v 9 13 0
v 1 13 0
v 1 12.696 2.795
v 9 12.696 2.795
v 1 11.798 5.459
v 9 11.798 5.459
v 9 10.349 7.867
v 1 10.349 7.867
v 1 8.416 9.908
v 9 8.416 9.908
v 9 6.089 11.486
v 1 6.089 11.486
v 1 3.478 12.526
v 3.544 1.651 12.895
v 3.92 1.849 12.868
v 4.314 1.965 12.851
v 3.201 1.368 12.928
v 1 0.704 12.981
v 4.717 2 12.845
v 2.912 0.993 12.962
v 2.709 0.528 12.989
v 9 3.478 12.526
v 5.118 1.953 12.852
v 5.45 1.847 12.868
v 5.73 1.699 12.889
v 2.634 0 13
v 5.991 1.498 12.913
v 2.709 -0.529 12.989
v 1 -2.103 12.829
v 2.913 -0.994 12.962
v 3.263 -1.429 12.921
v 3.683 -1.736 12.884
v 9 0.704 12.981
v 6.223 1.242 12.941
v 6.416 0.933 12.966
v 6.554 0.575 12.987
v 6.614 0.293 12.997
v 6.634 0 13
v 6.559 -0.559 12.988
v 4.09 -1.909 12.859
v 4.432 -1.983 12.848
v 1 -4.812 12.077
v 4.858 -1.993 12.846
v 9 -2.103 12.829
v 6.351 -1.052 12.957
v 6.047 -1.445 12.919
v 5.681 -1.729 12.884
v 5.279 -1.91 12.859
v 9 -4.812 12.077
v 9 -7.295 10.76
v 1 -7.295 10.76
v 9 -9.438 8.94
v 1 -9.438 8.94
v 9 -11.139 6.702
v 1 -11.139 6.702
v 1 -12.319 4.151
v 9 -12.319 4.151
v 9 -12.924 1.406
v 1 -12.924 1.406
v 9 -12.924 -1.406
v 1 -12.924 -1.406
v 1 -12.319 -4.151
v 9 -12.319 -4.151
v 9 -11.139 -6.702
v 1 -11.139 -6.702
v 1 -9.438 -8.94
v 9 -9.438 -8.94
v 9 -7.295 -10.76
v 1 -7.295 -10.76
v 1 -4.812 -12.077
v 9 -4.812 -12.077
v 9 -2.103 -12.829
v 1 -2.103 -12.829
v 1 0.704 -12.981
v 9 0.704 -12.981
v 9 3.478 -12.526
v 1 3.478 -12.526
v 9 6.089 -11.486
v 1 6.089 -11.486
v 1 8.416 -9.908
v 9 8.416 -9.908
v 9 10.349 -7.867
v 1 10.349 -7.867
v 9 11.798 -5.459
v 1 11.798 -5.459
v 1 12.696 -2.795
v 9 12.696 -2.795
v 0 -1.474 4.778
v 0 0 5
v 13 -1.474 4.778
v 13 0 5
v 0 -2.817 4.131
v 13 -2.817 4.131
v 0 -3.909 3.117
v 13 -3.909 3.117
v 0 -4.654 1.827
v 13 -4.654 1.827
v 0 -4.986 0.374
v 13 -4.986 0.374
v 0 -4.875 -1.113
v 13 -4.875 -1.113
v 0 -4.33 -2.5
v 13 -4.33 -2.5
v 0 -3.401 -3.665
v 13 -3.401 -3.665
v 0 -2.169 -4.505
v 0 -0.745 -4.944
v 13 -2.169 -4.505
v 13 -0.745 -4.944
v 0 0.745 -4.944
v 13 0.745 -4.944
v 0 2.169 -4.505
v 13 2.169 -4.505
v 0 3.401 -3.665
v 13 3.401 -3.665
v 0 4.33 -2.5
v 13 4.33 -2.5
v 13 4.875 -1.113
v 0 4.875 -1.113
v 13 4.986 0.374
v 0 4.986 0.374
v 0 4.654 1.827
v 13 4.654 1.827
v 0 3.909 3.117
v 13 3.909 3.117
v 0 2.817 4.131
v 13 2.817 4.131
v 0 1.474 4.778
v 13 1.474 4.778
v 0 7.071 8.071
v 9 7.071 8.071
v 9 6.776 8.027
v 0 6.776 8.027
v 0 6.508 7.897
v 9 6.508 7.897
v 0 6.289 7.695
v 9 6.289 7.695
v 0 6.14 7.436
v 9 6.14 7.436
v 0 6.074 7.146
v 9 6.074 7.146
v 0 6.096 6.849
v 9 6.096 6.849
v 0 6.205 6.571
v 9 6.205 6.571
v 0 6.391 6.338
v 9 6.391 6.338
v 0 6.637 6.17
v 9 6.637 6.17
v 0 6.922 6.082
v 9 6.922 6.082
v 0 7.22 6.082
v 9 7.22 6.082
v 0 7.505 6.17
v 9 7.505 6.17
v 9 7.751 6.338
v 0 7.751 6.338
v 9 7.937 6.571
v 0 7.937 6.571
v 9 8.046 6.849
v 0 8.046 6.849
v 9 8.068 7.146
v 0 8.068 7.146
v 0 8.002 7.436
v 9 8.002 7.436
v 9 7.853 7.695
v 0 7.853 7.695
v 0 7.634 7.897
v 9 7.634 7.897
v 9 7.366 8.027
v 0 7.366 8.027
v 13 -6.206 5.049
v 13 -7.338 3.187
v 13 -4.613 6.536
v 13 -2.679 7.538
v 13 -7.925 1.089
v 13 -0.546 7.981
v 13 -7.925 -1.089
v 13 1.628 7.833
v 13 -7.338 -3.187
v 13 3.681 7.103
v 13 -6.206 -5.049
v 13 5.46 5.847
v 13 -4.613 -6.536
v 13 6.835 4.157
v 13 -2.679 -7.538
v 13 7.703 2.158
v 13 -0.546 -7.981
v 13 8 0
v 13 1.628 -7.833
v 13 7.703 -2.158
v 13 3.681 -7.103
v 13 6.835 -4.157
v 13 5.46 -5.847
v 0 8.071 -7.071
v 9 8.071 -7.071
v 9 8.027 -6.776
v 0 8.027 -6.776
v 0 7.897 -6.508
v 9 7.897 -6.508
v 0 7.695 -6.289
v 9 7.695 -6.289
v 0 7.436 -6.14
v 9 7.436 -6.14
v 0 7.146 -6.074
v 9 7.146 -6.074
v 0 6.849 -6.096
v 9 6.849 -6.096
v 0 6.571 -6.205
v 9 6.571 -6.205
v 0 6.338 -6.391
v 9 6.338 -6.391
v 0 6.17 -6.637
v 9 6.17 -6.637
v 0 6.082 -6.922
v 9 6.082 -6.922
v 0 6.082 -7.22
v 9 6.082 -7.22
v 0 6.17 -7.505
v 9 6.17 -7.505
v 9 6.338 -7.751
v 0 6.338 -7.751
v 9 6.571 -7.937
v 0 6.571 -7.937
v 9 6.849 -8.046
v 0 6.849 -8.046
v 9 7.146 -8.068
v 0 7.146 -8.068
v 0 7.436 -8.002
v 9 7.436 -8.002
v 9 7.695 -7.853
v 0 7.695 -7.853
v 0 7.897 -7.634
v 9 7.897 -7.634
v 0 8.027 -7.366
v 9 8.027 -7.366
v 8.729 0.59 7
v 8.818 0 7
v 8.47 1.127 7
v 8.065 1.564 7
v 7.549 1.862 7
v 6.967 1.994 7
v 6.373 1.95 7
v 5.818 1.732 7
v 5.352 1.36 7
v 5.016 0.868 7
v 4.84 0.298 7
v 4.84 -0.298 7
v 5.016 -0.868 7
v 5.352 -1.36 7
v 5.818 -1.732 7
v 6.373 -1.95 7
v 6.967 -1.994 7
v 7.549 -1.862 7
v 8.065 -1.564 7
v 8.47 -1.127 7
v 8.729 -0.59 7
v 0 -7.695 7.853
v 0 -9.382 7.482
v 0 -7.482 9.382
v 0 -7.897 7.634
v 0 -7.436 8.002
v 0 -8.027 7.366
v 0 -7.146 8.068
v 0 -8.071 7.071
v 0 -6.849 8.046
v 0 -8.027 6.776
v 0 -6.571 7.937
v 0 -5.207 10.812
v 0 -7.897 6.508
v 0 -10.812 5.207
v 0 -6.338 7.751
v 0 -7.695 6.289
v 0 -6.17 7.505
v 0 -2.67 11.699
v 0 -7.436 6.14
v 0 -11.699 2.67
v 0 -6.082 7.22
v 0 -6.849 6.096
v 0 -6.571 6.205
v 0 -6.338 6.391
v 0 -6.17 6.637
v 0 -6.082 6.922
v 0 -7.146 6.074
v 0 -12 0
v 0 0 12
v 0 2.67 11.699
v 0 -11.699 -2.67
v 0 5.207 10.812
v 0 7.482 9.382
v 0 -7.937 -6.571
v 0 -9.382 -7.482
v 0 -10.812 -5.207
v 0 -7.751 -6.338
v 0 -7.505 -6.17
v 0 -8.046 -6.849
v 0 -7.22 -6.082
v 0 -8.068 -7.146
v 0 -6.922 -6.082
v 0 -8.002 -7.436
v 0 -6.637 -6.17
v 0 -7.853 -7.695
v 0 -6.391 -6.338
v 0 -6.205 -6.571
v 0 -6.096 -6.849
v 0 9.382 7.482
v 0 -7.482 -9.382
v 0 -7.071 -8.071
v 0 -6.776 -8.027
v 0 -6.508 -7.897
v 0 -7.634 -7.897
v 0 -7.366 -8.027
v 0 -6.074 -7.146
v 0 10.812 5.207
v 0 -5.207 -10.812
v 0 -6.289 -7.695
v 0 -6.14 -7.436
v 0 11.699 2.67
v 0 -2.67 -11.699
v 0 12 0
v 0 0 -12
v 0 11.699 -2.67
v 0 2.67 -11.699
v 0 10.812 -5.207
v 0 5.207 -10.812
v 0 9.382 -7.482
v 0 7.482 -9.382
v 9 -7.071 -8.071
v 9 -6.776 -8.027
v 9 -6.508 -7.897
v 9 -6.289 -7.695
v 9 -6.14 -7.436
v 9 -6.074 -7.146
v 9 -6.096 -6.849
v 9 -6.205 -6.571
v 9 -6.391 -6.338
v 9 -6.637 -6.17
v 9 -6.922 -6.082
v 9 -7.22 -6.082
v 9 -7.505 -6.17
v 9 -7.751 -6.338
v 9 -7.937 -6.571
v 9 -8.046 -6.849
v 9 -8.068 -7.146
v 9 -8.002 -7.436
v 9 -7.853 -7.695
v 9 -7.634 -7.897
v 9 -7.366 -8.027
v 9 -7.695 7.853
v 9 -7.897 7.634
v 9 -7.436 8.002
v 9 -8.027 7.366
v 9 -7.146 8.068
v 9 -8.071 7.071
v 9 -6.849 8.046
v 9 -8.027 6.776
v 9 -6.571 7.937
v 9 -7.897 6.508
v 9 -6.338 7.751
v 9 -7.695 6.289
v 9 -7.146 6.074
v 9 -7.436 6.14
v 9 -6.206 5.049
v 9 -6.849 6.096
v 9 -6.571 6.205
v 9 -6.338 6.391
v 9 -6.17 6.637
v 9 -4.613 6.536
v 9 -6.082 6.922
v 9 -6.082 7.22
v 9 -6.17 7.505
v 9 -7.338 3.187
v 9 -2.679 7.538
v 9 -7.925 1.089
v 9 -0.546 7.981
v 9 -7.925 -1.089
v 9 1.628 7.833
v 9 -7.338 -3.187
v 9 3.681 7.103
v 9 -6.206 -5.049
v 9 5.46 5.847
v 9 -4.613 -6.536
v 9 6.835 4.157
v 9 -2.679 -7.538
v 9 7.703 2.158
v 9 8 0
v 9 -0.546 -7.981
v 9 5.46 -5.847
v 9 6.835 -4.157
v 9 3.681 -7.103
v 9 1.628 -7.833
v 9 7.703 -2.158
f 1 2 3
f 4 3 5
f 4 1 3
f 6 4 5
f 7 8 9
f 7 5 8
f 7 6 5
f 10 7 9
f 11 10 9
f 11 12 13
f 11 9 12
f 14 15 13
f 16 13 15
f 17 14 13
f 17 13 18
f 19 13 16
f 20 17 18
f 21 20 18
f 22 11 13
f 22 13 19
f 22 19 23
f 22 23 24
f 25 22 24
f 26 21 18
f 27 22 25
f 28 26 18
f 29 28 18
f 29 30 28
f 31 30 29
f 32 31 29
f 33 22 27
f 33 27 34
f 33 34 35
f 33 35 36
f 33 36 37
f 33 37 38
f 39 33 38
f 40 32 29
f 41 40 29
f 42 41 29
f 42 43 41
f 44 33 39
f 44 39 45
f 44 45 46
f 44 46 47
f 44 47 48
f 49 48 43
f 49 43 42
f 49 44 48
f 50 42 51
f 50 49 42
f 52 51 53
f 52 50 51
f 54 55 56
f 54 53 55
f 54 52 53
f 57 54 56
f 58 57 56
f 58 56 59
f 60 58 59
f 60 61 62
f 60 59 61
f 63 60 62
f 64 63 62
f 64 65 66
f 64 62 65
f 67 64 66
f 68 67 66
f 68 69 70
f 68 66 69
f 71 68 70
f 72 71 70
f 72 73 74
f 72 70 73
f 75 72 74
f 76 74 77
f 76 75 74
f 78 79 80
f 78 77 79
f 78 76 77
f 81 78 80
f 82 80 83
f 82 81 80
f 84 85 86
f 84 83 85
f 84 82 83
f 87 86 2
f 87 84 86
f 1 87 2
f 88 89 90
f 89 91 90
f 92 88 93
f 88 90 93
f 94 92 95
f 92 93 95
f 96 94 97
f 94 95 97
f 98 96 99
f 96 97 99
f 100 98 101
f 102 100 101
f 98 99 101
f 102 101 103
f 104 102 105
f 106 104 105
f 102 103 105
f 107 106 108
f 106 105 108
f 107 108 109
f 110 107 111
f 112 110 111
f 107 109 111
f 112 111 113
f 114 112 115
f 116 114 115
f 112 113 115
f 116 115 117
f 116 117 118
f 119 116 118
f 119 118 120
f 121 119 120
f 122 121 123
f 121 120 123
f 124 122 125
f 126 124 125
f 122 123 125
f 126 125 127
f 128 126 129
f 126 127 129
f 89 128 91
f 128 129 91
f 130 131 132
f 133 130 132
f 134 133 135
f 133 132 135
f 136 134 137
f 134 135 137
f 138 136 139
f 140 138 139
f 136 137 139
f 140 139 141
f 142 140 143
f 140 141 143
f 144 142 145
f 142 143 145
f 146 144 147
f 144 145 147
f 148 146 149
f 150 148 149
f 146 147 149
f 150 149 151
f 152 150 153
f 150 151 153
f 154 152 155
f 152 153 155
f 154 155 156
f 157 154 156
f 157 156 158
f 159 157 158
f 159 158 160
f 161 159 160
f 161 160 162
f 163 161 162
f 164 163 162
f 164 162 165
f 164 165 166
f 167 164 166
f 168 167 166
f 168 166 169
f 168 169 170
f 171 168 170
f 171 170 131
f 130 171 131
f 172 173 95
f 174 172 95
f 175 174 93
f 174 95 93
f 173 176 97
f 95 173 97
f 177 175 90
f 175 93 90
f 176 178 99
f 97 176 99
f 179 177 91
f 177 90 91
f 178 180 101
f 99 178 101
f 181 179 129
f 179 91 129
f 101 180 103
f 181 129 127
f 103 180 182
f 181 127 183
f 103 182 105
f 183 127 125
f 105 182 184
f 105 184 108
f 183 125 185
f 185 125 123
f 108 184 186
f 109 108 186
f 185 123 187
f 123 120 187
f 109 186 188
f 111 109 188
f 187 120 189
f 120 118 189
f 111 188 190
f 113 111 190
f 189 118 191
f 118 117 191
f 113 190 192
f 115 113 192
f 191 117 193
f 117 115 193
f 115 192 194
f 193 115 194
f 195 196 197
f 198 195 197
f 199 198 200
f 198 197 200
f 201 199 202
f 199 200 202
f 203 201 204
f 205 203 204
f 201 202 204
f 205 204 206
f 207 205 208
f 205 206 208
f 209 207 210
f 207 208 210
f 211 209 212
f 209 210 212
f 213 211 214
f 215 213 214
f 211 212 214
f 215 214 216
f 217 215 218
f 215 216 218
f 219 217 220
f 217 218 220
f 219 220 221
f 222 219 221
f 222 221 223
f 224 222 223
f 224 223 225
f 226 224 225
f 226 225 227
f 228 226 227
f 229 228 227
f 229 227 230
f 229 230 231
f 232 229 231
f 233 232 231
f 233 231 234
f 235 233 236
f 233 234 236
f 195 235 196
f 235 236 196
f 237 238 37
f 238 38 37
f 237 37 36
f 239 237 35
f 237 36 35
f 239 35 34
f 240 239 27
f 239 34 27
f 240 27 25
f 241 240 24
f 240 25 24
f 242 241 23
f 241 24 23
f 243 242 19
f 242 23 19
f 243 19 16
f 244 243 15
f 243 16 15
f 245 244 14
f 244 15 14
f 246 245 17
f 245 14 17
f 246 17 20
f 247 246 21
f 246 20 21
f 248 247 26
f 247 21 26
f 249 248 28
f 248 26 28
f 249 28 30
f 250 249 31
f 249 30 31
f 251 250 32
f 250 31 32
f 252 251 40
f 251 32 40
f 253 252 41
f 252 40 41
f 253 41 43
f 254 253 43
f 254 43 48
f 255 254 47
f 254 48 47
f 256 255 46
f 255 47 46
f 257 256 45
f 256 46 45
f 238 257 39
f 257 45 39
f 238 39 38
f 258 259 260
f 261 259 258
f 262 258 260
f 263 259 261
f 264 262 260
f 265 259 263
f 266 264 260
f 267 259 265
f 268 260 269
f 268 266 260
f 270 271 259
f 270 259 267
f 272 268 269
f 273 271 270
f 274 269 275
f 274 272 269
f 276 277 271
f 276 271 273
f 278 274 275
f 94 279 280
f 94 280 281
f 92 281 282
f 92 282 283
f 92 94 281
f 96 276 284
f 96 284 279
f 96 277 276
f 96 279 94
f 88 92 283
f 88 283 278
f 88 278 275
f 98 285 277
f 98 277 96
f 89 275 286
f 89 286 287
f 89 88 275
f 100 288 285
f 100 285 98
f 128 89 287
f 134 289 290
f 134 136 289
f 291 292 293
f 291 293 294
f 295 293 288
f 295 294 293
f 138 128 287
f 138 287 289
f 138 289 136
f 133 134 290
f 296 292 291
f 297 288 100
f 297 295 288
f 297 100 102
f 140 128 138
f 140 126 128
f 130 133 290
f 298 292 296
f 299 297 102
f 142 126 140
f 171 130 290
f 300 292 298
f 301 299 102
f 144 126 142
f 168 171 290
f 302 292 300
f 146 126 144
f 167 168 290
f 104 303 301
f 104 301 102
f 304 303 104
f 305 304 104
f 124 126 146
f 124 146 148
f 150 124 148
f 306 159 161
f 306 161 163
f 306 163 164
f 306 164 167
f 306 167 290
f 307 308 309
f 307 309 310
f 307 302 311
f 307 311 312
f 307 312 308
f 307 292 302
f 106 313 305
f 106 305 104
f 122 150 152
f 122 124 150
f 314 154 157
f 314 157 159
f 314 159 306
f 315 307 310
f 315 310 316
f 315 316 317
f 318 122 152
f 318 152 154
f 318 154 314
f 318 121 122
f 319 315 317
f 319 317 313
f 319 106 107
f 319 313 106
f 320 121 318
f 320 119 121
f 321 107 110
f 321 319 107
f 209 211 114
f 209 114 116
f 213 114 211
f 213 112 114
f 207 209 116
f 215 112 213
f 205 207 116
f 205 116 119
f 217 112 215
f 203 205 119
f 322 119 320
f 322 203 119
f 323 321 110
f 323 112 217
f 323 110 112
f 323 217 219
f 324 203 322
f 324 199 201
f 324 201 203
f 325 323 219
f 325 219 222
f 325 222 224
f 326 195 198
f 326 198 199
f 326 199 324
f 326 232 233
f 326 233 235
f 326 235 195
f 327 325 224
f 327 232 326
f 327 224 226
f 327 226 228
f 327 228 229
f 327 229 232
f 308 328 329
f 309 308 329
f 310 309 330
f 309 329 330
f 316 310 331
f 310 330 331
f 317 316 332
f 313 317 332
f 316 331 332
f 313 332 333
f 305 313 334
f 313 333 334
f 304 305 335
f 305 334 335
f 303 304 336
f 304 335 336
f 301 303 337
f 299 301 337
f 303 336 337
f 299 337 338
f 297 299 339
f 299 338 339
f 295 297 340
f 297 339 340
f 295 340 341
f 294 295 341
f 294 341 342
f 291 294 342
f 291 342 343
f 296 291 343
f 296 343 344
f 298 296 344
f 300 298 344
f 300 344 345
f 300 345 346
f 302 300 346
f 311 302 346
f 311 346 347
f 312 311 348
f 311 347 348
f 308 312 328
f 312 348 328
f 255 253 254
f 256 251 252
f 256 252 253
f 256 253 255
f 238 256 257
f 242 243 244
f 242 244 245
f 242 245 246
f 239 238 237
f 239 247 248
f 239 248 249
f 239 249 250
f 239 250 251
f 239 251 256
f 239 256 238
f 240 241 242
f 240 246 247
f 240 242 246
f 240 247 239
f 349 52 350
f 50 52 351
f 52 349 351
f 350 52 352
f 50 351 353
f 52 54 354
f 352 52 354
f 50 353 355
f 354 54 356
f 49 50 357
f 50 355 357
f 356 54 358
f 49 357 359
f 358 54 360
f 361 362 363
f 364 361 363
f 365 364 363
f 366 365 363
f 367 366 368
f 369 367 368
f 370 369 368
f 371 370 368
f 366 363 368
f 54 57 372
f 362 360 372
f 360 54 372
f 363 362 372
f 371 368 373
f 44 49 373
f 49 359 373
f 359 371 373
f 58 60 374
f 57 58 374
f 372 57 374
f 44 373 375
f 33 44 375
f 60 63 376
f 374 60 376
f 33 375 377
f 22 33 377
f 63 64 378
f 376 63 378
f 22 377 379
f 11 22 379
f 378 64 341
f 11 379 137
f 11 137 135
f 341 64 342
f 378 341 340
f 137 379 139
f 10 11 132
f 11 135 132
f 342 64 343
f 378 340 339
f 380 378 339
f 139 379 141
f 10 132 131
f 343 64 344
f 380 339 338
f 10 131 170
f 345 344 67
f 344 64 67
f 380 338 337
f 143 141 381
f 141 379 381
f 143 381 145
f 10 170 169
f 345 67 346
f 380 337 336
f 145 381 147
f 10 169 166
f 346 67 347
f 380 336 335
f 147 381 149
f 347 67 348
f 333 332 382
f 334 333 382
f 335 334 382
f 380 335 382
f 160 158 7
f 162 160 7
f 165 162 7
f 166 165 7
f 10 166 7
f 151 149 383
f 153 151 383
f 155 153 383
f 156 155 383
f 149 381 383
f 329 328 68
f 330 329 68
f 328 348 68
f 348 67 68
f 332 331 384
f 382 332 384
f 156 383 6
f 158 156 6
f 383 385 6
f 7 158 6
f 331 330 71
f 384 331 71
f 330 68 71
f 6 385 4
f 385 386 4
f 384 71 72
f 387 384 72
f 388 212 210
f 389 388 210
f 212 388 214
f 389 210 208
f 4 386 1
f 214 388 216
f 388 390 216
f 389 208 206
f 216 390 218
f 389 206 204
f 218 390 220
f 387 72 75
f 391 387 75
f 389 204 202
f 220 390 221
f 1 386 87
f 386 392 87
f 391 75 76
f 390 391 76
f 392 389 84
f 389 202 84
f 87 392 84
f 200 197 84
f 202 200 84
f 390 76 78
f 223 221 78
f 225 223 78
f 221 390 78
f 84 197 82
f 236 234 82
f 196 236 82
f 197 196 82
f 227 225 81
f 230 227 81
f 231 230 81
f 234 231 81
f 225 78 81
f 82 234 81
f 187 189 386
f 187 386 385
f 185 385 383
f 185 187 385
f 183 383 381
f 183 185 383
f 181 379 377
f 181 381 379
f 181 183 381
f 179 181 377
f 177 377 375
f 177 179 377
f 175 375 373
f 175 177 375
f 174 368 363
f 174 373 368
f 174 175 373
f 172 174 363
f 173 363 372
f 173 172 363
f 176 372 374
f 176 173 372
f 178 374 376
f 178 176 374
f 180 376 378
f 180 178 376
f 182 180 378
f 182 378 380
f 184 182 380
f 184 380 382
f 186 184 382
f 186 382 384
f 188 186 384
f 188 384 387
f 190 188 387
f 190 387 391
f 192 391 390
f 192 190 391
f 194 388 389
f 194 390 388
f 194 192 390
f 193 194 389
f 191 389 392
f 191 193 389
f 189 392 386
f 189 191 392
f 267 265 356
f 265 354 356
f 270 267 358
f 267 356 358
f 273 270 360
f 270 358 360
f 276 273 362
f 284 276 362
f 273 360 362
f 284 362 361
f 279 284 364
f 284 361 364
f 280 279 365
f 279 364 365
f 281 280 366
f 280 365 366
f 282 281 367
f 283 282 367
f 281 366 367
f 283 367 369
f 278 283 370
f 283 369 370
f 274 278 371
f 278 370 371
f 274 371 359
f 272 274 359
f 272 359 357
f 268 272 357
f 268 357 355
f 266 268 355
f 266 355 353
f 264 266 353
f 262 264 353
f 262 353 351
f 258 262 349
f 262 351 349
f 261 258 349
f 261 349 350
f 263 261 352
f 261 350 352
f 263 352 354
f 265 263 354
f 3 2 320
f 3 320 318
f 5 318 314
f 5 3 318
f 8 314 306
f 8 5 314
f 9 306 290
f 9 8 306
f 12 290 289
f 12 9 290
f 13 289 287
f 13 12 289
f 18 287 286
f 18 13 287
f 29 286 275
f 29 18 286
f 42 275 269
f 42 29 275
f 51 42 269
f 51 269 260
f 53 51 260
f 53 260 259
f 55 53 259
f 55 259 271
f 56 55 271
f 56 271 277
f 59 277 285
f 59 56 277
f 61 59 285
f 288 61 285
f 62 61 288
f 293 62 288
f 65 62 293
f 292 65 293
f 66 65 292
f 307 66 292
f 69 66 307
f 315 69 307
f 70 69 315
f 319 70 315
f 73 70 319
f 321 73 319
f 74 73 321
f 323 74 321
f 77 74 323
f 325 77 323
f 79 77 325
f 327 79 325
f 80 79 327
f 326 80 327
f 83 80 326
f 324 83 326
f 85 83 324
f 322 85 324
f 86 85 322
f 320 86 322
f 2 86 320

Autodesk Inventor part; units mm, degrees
ref_plane "YZ Plane" through (0, 0, 0) normal (1, 0, 0) x (0, 1, 0)
sketch "Sketch1" plane through (0, 0, 0) normal (0, 0, 1) x (1, 0, 0)
  line L0 (0, 0) -> (0, 13)
  line L1 (0, 13) -> (9, 13)
  line L2 (9, 13) -> (9, 8)
  line L3 (9, 8) -> (13, 8)
  line L4 (13, 8) -> (13, 0)
  line L5 (13, 0) -> (0, 0)
  dimension "d0" = 16
  dimension "d1" = 9
  dimension "d2" = 4
  dimension "d3" = 26
revolve "Revolution1" add sketch "Sketch1" angle 360 about axis through (13, 0, 0) along (-1, 0, 0)
sketch "Sketch2" plane through (0, 0, 0) normal (-1, 0, 0) x (0, 0, 1)
  line L0 (0, 0) -> (7.0711, 7.0711) construction
  line L1 (0, 0) -> (13, 0) construction
  circle A0 centre (0, 0) radius 13 projected
  circle A1 centre (0, 0) radius 10 construction
  dimension "d6" = 20
  dimension "d5" = 45
hole "Hole1" at (0, 7.0711, 7.0711) direction (1, 0, 0) diameter 2 depth 9
pattern_circular "Circular Pattern1" count 4 over 360 about axis through (4.5, 0, 0) along (-1, 0, 0) of "Hole1"
sketch "Sketch3" plane through (0, 0, 0) normal (-1, 0, 0) x (0, 0, 1)
  circle A0 centre (0, 0) radius 13 projected
  point P0 (0, 0)
hole "Hole2" at (0, 0, 0) direction (1, 0, 0) diameter 10 depth 13
chamfer "Chamfer1" distance 1 angle 45 1 edges at (0, -13, 0)
ref_plane "Work Plane1" through (0, 0, 0) normal (0, 1, 0) x (-1, 0, 0)
sketch "Sketch4" plane through (0, 0, 0) normal (0, 1, 0) x (-1, 0, 0)
  line L0 (-13, -5) -> (-13, 5) projected
  line L1 (-13, -8) -> (-13, 8) projected
  line L2 (-7, 7) -> (-4.8162, 13)
  line L3 (-9, 13) -> (-1, 13) projected
  line L4 (-13, 5) -> (0, 5) projected
  point P0 (0, 0)
  dimension "d28" = 20
  dimension "d29" = 2
  dimension "d34" = 2
ref_plane "Work Plane2" through (0, 0, 12.5) normal (0, 0, 1) x (1, 0, 0)
sketch "Sketch5" plane through (0, 0, 12.5) normal (0, 0, 1) x (1, 0, 0)
  circle A0 centre (4.8162, 0) radius 2
  point P0 (0, 0)
  dimension "d31" = 4
sweep "Sweep1" cut profiles "Sketch5" path "Sketch4" path curves L2
properties part number "08"
